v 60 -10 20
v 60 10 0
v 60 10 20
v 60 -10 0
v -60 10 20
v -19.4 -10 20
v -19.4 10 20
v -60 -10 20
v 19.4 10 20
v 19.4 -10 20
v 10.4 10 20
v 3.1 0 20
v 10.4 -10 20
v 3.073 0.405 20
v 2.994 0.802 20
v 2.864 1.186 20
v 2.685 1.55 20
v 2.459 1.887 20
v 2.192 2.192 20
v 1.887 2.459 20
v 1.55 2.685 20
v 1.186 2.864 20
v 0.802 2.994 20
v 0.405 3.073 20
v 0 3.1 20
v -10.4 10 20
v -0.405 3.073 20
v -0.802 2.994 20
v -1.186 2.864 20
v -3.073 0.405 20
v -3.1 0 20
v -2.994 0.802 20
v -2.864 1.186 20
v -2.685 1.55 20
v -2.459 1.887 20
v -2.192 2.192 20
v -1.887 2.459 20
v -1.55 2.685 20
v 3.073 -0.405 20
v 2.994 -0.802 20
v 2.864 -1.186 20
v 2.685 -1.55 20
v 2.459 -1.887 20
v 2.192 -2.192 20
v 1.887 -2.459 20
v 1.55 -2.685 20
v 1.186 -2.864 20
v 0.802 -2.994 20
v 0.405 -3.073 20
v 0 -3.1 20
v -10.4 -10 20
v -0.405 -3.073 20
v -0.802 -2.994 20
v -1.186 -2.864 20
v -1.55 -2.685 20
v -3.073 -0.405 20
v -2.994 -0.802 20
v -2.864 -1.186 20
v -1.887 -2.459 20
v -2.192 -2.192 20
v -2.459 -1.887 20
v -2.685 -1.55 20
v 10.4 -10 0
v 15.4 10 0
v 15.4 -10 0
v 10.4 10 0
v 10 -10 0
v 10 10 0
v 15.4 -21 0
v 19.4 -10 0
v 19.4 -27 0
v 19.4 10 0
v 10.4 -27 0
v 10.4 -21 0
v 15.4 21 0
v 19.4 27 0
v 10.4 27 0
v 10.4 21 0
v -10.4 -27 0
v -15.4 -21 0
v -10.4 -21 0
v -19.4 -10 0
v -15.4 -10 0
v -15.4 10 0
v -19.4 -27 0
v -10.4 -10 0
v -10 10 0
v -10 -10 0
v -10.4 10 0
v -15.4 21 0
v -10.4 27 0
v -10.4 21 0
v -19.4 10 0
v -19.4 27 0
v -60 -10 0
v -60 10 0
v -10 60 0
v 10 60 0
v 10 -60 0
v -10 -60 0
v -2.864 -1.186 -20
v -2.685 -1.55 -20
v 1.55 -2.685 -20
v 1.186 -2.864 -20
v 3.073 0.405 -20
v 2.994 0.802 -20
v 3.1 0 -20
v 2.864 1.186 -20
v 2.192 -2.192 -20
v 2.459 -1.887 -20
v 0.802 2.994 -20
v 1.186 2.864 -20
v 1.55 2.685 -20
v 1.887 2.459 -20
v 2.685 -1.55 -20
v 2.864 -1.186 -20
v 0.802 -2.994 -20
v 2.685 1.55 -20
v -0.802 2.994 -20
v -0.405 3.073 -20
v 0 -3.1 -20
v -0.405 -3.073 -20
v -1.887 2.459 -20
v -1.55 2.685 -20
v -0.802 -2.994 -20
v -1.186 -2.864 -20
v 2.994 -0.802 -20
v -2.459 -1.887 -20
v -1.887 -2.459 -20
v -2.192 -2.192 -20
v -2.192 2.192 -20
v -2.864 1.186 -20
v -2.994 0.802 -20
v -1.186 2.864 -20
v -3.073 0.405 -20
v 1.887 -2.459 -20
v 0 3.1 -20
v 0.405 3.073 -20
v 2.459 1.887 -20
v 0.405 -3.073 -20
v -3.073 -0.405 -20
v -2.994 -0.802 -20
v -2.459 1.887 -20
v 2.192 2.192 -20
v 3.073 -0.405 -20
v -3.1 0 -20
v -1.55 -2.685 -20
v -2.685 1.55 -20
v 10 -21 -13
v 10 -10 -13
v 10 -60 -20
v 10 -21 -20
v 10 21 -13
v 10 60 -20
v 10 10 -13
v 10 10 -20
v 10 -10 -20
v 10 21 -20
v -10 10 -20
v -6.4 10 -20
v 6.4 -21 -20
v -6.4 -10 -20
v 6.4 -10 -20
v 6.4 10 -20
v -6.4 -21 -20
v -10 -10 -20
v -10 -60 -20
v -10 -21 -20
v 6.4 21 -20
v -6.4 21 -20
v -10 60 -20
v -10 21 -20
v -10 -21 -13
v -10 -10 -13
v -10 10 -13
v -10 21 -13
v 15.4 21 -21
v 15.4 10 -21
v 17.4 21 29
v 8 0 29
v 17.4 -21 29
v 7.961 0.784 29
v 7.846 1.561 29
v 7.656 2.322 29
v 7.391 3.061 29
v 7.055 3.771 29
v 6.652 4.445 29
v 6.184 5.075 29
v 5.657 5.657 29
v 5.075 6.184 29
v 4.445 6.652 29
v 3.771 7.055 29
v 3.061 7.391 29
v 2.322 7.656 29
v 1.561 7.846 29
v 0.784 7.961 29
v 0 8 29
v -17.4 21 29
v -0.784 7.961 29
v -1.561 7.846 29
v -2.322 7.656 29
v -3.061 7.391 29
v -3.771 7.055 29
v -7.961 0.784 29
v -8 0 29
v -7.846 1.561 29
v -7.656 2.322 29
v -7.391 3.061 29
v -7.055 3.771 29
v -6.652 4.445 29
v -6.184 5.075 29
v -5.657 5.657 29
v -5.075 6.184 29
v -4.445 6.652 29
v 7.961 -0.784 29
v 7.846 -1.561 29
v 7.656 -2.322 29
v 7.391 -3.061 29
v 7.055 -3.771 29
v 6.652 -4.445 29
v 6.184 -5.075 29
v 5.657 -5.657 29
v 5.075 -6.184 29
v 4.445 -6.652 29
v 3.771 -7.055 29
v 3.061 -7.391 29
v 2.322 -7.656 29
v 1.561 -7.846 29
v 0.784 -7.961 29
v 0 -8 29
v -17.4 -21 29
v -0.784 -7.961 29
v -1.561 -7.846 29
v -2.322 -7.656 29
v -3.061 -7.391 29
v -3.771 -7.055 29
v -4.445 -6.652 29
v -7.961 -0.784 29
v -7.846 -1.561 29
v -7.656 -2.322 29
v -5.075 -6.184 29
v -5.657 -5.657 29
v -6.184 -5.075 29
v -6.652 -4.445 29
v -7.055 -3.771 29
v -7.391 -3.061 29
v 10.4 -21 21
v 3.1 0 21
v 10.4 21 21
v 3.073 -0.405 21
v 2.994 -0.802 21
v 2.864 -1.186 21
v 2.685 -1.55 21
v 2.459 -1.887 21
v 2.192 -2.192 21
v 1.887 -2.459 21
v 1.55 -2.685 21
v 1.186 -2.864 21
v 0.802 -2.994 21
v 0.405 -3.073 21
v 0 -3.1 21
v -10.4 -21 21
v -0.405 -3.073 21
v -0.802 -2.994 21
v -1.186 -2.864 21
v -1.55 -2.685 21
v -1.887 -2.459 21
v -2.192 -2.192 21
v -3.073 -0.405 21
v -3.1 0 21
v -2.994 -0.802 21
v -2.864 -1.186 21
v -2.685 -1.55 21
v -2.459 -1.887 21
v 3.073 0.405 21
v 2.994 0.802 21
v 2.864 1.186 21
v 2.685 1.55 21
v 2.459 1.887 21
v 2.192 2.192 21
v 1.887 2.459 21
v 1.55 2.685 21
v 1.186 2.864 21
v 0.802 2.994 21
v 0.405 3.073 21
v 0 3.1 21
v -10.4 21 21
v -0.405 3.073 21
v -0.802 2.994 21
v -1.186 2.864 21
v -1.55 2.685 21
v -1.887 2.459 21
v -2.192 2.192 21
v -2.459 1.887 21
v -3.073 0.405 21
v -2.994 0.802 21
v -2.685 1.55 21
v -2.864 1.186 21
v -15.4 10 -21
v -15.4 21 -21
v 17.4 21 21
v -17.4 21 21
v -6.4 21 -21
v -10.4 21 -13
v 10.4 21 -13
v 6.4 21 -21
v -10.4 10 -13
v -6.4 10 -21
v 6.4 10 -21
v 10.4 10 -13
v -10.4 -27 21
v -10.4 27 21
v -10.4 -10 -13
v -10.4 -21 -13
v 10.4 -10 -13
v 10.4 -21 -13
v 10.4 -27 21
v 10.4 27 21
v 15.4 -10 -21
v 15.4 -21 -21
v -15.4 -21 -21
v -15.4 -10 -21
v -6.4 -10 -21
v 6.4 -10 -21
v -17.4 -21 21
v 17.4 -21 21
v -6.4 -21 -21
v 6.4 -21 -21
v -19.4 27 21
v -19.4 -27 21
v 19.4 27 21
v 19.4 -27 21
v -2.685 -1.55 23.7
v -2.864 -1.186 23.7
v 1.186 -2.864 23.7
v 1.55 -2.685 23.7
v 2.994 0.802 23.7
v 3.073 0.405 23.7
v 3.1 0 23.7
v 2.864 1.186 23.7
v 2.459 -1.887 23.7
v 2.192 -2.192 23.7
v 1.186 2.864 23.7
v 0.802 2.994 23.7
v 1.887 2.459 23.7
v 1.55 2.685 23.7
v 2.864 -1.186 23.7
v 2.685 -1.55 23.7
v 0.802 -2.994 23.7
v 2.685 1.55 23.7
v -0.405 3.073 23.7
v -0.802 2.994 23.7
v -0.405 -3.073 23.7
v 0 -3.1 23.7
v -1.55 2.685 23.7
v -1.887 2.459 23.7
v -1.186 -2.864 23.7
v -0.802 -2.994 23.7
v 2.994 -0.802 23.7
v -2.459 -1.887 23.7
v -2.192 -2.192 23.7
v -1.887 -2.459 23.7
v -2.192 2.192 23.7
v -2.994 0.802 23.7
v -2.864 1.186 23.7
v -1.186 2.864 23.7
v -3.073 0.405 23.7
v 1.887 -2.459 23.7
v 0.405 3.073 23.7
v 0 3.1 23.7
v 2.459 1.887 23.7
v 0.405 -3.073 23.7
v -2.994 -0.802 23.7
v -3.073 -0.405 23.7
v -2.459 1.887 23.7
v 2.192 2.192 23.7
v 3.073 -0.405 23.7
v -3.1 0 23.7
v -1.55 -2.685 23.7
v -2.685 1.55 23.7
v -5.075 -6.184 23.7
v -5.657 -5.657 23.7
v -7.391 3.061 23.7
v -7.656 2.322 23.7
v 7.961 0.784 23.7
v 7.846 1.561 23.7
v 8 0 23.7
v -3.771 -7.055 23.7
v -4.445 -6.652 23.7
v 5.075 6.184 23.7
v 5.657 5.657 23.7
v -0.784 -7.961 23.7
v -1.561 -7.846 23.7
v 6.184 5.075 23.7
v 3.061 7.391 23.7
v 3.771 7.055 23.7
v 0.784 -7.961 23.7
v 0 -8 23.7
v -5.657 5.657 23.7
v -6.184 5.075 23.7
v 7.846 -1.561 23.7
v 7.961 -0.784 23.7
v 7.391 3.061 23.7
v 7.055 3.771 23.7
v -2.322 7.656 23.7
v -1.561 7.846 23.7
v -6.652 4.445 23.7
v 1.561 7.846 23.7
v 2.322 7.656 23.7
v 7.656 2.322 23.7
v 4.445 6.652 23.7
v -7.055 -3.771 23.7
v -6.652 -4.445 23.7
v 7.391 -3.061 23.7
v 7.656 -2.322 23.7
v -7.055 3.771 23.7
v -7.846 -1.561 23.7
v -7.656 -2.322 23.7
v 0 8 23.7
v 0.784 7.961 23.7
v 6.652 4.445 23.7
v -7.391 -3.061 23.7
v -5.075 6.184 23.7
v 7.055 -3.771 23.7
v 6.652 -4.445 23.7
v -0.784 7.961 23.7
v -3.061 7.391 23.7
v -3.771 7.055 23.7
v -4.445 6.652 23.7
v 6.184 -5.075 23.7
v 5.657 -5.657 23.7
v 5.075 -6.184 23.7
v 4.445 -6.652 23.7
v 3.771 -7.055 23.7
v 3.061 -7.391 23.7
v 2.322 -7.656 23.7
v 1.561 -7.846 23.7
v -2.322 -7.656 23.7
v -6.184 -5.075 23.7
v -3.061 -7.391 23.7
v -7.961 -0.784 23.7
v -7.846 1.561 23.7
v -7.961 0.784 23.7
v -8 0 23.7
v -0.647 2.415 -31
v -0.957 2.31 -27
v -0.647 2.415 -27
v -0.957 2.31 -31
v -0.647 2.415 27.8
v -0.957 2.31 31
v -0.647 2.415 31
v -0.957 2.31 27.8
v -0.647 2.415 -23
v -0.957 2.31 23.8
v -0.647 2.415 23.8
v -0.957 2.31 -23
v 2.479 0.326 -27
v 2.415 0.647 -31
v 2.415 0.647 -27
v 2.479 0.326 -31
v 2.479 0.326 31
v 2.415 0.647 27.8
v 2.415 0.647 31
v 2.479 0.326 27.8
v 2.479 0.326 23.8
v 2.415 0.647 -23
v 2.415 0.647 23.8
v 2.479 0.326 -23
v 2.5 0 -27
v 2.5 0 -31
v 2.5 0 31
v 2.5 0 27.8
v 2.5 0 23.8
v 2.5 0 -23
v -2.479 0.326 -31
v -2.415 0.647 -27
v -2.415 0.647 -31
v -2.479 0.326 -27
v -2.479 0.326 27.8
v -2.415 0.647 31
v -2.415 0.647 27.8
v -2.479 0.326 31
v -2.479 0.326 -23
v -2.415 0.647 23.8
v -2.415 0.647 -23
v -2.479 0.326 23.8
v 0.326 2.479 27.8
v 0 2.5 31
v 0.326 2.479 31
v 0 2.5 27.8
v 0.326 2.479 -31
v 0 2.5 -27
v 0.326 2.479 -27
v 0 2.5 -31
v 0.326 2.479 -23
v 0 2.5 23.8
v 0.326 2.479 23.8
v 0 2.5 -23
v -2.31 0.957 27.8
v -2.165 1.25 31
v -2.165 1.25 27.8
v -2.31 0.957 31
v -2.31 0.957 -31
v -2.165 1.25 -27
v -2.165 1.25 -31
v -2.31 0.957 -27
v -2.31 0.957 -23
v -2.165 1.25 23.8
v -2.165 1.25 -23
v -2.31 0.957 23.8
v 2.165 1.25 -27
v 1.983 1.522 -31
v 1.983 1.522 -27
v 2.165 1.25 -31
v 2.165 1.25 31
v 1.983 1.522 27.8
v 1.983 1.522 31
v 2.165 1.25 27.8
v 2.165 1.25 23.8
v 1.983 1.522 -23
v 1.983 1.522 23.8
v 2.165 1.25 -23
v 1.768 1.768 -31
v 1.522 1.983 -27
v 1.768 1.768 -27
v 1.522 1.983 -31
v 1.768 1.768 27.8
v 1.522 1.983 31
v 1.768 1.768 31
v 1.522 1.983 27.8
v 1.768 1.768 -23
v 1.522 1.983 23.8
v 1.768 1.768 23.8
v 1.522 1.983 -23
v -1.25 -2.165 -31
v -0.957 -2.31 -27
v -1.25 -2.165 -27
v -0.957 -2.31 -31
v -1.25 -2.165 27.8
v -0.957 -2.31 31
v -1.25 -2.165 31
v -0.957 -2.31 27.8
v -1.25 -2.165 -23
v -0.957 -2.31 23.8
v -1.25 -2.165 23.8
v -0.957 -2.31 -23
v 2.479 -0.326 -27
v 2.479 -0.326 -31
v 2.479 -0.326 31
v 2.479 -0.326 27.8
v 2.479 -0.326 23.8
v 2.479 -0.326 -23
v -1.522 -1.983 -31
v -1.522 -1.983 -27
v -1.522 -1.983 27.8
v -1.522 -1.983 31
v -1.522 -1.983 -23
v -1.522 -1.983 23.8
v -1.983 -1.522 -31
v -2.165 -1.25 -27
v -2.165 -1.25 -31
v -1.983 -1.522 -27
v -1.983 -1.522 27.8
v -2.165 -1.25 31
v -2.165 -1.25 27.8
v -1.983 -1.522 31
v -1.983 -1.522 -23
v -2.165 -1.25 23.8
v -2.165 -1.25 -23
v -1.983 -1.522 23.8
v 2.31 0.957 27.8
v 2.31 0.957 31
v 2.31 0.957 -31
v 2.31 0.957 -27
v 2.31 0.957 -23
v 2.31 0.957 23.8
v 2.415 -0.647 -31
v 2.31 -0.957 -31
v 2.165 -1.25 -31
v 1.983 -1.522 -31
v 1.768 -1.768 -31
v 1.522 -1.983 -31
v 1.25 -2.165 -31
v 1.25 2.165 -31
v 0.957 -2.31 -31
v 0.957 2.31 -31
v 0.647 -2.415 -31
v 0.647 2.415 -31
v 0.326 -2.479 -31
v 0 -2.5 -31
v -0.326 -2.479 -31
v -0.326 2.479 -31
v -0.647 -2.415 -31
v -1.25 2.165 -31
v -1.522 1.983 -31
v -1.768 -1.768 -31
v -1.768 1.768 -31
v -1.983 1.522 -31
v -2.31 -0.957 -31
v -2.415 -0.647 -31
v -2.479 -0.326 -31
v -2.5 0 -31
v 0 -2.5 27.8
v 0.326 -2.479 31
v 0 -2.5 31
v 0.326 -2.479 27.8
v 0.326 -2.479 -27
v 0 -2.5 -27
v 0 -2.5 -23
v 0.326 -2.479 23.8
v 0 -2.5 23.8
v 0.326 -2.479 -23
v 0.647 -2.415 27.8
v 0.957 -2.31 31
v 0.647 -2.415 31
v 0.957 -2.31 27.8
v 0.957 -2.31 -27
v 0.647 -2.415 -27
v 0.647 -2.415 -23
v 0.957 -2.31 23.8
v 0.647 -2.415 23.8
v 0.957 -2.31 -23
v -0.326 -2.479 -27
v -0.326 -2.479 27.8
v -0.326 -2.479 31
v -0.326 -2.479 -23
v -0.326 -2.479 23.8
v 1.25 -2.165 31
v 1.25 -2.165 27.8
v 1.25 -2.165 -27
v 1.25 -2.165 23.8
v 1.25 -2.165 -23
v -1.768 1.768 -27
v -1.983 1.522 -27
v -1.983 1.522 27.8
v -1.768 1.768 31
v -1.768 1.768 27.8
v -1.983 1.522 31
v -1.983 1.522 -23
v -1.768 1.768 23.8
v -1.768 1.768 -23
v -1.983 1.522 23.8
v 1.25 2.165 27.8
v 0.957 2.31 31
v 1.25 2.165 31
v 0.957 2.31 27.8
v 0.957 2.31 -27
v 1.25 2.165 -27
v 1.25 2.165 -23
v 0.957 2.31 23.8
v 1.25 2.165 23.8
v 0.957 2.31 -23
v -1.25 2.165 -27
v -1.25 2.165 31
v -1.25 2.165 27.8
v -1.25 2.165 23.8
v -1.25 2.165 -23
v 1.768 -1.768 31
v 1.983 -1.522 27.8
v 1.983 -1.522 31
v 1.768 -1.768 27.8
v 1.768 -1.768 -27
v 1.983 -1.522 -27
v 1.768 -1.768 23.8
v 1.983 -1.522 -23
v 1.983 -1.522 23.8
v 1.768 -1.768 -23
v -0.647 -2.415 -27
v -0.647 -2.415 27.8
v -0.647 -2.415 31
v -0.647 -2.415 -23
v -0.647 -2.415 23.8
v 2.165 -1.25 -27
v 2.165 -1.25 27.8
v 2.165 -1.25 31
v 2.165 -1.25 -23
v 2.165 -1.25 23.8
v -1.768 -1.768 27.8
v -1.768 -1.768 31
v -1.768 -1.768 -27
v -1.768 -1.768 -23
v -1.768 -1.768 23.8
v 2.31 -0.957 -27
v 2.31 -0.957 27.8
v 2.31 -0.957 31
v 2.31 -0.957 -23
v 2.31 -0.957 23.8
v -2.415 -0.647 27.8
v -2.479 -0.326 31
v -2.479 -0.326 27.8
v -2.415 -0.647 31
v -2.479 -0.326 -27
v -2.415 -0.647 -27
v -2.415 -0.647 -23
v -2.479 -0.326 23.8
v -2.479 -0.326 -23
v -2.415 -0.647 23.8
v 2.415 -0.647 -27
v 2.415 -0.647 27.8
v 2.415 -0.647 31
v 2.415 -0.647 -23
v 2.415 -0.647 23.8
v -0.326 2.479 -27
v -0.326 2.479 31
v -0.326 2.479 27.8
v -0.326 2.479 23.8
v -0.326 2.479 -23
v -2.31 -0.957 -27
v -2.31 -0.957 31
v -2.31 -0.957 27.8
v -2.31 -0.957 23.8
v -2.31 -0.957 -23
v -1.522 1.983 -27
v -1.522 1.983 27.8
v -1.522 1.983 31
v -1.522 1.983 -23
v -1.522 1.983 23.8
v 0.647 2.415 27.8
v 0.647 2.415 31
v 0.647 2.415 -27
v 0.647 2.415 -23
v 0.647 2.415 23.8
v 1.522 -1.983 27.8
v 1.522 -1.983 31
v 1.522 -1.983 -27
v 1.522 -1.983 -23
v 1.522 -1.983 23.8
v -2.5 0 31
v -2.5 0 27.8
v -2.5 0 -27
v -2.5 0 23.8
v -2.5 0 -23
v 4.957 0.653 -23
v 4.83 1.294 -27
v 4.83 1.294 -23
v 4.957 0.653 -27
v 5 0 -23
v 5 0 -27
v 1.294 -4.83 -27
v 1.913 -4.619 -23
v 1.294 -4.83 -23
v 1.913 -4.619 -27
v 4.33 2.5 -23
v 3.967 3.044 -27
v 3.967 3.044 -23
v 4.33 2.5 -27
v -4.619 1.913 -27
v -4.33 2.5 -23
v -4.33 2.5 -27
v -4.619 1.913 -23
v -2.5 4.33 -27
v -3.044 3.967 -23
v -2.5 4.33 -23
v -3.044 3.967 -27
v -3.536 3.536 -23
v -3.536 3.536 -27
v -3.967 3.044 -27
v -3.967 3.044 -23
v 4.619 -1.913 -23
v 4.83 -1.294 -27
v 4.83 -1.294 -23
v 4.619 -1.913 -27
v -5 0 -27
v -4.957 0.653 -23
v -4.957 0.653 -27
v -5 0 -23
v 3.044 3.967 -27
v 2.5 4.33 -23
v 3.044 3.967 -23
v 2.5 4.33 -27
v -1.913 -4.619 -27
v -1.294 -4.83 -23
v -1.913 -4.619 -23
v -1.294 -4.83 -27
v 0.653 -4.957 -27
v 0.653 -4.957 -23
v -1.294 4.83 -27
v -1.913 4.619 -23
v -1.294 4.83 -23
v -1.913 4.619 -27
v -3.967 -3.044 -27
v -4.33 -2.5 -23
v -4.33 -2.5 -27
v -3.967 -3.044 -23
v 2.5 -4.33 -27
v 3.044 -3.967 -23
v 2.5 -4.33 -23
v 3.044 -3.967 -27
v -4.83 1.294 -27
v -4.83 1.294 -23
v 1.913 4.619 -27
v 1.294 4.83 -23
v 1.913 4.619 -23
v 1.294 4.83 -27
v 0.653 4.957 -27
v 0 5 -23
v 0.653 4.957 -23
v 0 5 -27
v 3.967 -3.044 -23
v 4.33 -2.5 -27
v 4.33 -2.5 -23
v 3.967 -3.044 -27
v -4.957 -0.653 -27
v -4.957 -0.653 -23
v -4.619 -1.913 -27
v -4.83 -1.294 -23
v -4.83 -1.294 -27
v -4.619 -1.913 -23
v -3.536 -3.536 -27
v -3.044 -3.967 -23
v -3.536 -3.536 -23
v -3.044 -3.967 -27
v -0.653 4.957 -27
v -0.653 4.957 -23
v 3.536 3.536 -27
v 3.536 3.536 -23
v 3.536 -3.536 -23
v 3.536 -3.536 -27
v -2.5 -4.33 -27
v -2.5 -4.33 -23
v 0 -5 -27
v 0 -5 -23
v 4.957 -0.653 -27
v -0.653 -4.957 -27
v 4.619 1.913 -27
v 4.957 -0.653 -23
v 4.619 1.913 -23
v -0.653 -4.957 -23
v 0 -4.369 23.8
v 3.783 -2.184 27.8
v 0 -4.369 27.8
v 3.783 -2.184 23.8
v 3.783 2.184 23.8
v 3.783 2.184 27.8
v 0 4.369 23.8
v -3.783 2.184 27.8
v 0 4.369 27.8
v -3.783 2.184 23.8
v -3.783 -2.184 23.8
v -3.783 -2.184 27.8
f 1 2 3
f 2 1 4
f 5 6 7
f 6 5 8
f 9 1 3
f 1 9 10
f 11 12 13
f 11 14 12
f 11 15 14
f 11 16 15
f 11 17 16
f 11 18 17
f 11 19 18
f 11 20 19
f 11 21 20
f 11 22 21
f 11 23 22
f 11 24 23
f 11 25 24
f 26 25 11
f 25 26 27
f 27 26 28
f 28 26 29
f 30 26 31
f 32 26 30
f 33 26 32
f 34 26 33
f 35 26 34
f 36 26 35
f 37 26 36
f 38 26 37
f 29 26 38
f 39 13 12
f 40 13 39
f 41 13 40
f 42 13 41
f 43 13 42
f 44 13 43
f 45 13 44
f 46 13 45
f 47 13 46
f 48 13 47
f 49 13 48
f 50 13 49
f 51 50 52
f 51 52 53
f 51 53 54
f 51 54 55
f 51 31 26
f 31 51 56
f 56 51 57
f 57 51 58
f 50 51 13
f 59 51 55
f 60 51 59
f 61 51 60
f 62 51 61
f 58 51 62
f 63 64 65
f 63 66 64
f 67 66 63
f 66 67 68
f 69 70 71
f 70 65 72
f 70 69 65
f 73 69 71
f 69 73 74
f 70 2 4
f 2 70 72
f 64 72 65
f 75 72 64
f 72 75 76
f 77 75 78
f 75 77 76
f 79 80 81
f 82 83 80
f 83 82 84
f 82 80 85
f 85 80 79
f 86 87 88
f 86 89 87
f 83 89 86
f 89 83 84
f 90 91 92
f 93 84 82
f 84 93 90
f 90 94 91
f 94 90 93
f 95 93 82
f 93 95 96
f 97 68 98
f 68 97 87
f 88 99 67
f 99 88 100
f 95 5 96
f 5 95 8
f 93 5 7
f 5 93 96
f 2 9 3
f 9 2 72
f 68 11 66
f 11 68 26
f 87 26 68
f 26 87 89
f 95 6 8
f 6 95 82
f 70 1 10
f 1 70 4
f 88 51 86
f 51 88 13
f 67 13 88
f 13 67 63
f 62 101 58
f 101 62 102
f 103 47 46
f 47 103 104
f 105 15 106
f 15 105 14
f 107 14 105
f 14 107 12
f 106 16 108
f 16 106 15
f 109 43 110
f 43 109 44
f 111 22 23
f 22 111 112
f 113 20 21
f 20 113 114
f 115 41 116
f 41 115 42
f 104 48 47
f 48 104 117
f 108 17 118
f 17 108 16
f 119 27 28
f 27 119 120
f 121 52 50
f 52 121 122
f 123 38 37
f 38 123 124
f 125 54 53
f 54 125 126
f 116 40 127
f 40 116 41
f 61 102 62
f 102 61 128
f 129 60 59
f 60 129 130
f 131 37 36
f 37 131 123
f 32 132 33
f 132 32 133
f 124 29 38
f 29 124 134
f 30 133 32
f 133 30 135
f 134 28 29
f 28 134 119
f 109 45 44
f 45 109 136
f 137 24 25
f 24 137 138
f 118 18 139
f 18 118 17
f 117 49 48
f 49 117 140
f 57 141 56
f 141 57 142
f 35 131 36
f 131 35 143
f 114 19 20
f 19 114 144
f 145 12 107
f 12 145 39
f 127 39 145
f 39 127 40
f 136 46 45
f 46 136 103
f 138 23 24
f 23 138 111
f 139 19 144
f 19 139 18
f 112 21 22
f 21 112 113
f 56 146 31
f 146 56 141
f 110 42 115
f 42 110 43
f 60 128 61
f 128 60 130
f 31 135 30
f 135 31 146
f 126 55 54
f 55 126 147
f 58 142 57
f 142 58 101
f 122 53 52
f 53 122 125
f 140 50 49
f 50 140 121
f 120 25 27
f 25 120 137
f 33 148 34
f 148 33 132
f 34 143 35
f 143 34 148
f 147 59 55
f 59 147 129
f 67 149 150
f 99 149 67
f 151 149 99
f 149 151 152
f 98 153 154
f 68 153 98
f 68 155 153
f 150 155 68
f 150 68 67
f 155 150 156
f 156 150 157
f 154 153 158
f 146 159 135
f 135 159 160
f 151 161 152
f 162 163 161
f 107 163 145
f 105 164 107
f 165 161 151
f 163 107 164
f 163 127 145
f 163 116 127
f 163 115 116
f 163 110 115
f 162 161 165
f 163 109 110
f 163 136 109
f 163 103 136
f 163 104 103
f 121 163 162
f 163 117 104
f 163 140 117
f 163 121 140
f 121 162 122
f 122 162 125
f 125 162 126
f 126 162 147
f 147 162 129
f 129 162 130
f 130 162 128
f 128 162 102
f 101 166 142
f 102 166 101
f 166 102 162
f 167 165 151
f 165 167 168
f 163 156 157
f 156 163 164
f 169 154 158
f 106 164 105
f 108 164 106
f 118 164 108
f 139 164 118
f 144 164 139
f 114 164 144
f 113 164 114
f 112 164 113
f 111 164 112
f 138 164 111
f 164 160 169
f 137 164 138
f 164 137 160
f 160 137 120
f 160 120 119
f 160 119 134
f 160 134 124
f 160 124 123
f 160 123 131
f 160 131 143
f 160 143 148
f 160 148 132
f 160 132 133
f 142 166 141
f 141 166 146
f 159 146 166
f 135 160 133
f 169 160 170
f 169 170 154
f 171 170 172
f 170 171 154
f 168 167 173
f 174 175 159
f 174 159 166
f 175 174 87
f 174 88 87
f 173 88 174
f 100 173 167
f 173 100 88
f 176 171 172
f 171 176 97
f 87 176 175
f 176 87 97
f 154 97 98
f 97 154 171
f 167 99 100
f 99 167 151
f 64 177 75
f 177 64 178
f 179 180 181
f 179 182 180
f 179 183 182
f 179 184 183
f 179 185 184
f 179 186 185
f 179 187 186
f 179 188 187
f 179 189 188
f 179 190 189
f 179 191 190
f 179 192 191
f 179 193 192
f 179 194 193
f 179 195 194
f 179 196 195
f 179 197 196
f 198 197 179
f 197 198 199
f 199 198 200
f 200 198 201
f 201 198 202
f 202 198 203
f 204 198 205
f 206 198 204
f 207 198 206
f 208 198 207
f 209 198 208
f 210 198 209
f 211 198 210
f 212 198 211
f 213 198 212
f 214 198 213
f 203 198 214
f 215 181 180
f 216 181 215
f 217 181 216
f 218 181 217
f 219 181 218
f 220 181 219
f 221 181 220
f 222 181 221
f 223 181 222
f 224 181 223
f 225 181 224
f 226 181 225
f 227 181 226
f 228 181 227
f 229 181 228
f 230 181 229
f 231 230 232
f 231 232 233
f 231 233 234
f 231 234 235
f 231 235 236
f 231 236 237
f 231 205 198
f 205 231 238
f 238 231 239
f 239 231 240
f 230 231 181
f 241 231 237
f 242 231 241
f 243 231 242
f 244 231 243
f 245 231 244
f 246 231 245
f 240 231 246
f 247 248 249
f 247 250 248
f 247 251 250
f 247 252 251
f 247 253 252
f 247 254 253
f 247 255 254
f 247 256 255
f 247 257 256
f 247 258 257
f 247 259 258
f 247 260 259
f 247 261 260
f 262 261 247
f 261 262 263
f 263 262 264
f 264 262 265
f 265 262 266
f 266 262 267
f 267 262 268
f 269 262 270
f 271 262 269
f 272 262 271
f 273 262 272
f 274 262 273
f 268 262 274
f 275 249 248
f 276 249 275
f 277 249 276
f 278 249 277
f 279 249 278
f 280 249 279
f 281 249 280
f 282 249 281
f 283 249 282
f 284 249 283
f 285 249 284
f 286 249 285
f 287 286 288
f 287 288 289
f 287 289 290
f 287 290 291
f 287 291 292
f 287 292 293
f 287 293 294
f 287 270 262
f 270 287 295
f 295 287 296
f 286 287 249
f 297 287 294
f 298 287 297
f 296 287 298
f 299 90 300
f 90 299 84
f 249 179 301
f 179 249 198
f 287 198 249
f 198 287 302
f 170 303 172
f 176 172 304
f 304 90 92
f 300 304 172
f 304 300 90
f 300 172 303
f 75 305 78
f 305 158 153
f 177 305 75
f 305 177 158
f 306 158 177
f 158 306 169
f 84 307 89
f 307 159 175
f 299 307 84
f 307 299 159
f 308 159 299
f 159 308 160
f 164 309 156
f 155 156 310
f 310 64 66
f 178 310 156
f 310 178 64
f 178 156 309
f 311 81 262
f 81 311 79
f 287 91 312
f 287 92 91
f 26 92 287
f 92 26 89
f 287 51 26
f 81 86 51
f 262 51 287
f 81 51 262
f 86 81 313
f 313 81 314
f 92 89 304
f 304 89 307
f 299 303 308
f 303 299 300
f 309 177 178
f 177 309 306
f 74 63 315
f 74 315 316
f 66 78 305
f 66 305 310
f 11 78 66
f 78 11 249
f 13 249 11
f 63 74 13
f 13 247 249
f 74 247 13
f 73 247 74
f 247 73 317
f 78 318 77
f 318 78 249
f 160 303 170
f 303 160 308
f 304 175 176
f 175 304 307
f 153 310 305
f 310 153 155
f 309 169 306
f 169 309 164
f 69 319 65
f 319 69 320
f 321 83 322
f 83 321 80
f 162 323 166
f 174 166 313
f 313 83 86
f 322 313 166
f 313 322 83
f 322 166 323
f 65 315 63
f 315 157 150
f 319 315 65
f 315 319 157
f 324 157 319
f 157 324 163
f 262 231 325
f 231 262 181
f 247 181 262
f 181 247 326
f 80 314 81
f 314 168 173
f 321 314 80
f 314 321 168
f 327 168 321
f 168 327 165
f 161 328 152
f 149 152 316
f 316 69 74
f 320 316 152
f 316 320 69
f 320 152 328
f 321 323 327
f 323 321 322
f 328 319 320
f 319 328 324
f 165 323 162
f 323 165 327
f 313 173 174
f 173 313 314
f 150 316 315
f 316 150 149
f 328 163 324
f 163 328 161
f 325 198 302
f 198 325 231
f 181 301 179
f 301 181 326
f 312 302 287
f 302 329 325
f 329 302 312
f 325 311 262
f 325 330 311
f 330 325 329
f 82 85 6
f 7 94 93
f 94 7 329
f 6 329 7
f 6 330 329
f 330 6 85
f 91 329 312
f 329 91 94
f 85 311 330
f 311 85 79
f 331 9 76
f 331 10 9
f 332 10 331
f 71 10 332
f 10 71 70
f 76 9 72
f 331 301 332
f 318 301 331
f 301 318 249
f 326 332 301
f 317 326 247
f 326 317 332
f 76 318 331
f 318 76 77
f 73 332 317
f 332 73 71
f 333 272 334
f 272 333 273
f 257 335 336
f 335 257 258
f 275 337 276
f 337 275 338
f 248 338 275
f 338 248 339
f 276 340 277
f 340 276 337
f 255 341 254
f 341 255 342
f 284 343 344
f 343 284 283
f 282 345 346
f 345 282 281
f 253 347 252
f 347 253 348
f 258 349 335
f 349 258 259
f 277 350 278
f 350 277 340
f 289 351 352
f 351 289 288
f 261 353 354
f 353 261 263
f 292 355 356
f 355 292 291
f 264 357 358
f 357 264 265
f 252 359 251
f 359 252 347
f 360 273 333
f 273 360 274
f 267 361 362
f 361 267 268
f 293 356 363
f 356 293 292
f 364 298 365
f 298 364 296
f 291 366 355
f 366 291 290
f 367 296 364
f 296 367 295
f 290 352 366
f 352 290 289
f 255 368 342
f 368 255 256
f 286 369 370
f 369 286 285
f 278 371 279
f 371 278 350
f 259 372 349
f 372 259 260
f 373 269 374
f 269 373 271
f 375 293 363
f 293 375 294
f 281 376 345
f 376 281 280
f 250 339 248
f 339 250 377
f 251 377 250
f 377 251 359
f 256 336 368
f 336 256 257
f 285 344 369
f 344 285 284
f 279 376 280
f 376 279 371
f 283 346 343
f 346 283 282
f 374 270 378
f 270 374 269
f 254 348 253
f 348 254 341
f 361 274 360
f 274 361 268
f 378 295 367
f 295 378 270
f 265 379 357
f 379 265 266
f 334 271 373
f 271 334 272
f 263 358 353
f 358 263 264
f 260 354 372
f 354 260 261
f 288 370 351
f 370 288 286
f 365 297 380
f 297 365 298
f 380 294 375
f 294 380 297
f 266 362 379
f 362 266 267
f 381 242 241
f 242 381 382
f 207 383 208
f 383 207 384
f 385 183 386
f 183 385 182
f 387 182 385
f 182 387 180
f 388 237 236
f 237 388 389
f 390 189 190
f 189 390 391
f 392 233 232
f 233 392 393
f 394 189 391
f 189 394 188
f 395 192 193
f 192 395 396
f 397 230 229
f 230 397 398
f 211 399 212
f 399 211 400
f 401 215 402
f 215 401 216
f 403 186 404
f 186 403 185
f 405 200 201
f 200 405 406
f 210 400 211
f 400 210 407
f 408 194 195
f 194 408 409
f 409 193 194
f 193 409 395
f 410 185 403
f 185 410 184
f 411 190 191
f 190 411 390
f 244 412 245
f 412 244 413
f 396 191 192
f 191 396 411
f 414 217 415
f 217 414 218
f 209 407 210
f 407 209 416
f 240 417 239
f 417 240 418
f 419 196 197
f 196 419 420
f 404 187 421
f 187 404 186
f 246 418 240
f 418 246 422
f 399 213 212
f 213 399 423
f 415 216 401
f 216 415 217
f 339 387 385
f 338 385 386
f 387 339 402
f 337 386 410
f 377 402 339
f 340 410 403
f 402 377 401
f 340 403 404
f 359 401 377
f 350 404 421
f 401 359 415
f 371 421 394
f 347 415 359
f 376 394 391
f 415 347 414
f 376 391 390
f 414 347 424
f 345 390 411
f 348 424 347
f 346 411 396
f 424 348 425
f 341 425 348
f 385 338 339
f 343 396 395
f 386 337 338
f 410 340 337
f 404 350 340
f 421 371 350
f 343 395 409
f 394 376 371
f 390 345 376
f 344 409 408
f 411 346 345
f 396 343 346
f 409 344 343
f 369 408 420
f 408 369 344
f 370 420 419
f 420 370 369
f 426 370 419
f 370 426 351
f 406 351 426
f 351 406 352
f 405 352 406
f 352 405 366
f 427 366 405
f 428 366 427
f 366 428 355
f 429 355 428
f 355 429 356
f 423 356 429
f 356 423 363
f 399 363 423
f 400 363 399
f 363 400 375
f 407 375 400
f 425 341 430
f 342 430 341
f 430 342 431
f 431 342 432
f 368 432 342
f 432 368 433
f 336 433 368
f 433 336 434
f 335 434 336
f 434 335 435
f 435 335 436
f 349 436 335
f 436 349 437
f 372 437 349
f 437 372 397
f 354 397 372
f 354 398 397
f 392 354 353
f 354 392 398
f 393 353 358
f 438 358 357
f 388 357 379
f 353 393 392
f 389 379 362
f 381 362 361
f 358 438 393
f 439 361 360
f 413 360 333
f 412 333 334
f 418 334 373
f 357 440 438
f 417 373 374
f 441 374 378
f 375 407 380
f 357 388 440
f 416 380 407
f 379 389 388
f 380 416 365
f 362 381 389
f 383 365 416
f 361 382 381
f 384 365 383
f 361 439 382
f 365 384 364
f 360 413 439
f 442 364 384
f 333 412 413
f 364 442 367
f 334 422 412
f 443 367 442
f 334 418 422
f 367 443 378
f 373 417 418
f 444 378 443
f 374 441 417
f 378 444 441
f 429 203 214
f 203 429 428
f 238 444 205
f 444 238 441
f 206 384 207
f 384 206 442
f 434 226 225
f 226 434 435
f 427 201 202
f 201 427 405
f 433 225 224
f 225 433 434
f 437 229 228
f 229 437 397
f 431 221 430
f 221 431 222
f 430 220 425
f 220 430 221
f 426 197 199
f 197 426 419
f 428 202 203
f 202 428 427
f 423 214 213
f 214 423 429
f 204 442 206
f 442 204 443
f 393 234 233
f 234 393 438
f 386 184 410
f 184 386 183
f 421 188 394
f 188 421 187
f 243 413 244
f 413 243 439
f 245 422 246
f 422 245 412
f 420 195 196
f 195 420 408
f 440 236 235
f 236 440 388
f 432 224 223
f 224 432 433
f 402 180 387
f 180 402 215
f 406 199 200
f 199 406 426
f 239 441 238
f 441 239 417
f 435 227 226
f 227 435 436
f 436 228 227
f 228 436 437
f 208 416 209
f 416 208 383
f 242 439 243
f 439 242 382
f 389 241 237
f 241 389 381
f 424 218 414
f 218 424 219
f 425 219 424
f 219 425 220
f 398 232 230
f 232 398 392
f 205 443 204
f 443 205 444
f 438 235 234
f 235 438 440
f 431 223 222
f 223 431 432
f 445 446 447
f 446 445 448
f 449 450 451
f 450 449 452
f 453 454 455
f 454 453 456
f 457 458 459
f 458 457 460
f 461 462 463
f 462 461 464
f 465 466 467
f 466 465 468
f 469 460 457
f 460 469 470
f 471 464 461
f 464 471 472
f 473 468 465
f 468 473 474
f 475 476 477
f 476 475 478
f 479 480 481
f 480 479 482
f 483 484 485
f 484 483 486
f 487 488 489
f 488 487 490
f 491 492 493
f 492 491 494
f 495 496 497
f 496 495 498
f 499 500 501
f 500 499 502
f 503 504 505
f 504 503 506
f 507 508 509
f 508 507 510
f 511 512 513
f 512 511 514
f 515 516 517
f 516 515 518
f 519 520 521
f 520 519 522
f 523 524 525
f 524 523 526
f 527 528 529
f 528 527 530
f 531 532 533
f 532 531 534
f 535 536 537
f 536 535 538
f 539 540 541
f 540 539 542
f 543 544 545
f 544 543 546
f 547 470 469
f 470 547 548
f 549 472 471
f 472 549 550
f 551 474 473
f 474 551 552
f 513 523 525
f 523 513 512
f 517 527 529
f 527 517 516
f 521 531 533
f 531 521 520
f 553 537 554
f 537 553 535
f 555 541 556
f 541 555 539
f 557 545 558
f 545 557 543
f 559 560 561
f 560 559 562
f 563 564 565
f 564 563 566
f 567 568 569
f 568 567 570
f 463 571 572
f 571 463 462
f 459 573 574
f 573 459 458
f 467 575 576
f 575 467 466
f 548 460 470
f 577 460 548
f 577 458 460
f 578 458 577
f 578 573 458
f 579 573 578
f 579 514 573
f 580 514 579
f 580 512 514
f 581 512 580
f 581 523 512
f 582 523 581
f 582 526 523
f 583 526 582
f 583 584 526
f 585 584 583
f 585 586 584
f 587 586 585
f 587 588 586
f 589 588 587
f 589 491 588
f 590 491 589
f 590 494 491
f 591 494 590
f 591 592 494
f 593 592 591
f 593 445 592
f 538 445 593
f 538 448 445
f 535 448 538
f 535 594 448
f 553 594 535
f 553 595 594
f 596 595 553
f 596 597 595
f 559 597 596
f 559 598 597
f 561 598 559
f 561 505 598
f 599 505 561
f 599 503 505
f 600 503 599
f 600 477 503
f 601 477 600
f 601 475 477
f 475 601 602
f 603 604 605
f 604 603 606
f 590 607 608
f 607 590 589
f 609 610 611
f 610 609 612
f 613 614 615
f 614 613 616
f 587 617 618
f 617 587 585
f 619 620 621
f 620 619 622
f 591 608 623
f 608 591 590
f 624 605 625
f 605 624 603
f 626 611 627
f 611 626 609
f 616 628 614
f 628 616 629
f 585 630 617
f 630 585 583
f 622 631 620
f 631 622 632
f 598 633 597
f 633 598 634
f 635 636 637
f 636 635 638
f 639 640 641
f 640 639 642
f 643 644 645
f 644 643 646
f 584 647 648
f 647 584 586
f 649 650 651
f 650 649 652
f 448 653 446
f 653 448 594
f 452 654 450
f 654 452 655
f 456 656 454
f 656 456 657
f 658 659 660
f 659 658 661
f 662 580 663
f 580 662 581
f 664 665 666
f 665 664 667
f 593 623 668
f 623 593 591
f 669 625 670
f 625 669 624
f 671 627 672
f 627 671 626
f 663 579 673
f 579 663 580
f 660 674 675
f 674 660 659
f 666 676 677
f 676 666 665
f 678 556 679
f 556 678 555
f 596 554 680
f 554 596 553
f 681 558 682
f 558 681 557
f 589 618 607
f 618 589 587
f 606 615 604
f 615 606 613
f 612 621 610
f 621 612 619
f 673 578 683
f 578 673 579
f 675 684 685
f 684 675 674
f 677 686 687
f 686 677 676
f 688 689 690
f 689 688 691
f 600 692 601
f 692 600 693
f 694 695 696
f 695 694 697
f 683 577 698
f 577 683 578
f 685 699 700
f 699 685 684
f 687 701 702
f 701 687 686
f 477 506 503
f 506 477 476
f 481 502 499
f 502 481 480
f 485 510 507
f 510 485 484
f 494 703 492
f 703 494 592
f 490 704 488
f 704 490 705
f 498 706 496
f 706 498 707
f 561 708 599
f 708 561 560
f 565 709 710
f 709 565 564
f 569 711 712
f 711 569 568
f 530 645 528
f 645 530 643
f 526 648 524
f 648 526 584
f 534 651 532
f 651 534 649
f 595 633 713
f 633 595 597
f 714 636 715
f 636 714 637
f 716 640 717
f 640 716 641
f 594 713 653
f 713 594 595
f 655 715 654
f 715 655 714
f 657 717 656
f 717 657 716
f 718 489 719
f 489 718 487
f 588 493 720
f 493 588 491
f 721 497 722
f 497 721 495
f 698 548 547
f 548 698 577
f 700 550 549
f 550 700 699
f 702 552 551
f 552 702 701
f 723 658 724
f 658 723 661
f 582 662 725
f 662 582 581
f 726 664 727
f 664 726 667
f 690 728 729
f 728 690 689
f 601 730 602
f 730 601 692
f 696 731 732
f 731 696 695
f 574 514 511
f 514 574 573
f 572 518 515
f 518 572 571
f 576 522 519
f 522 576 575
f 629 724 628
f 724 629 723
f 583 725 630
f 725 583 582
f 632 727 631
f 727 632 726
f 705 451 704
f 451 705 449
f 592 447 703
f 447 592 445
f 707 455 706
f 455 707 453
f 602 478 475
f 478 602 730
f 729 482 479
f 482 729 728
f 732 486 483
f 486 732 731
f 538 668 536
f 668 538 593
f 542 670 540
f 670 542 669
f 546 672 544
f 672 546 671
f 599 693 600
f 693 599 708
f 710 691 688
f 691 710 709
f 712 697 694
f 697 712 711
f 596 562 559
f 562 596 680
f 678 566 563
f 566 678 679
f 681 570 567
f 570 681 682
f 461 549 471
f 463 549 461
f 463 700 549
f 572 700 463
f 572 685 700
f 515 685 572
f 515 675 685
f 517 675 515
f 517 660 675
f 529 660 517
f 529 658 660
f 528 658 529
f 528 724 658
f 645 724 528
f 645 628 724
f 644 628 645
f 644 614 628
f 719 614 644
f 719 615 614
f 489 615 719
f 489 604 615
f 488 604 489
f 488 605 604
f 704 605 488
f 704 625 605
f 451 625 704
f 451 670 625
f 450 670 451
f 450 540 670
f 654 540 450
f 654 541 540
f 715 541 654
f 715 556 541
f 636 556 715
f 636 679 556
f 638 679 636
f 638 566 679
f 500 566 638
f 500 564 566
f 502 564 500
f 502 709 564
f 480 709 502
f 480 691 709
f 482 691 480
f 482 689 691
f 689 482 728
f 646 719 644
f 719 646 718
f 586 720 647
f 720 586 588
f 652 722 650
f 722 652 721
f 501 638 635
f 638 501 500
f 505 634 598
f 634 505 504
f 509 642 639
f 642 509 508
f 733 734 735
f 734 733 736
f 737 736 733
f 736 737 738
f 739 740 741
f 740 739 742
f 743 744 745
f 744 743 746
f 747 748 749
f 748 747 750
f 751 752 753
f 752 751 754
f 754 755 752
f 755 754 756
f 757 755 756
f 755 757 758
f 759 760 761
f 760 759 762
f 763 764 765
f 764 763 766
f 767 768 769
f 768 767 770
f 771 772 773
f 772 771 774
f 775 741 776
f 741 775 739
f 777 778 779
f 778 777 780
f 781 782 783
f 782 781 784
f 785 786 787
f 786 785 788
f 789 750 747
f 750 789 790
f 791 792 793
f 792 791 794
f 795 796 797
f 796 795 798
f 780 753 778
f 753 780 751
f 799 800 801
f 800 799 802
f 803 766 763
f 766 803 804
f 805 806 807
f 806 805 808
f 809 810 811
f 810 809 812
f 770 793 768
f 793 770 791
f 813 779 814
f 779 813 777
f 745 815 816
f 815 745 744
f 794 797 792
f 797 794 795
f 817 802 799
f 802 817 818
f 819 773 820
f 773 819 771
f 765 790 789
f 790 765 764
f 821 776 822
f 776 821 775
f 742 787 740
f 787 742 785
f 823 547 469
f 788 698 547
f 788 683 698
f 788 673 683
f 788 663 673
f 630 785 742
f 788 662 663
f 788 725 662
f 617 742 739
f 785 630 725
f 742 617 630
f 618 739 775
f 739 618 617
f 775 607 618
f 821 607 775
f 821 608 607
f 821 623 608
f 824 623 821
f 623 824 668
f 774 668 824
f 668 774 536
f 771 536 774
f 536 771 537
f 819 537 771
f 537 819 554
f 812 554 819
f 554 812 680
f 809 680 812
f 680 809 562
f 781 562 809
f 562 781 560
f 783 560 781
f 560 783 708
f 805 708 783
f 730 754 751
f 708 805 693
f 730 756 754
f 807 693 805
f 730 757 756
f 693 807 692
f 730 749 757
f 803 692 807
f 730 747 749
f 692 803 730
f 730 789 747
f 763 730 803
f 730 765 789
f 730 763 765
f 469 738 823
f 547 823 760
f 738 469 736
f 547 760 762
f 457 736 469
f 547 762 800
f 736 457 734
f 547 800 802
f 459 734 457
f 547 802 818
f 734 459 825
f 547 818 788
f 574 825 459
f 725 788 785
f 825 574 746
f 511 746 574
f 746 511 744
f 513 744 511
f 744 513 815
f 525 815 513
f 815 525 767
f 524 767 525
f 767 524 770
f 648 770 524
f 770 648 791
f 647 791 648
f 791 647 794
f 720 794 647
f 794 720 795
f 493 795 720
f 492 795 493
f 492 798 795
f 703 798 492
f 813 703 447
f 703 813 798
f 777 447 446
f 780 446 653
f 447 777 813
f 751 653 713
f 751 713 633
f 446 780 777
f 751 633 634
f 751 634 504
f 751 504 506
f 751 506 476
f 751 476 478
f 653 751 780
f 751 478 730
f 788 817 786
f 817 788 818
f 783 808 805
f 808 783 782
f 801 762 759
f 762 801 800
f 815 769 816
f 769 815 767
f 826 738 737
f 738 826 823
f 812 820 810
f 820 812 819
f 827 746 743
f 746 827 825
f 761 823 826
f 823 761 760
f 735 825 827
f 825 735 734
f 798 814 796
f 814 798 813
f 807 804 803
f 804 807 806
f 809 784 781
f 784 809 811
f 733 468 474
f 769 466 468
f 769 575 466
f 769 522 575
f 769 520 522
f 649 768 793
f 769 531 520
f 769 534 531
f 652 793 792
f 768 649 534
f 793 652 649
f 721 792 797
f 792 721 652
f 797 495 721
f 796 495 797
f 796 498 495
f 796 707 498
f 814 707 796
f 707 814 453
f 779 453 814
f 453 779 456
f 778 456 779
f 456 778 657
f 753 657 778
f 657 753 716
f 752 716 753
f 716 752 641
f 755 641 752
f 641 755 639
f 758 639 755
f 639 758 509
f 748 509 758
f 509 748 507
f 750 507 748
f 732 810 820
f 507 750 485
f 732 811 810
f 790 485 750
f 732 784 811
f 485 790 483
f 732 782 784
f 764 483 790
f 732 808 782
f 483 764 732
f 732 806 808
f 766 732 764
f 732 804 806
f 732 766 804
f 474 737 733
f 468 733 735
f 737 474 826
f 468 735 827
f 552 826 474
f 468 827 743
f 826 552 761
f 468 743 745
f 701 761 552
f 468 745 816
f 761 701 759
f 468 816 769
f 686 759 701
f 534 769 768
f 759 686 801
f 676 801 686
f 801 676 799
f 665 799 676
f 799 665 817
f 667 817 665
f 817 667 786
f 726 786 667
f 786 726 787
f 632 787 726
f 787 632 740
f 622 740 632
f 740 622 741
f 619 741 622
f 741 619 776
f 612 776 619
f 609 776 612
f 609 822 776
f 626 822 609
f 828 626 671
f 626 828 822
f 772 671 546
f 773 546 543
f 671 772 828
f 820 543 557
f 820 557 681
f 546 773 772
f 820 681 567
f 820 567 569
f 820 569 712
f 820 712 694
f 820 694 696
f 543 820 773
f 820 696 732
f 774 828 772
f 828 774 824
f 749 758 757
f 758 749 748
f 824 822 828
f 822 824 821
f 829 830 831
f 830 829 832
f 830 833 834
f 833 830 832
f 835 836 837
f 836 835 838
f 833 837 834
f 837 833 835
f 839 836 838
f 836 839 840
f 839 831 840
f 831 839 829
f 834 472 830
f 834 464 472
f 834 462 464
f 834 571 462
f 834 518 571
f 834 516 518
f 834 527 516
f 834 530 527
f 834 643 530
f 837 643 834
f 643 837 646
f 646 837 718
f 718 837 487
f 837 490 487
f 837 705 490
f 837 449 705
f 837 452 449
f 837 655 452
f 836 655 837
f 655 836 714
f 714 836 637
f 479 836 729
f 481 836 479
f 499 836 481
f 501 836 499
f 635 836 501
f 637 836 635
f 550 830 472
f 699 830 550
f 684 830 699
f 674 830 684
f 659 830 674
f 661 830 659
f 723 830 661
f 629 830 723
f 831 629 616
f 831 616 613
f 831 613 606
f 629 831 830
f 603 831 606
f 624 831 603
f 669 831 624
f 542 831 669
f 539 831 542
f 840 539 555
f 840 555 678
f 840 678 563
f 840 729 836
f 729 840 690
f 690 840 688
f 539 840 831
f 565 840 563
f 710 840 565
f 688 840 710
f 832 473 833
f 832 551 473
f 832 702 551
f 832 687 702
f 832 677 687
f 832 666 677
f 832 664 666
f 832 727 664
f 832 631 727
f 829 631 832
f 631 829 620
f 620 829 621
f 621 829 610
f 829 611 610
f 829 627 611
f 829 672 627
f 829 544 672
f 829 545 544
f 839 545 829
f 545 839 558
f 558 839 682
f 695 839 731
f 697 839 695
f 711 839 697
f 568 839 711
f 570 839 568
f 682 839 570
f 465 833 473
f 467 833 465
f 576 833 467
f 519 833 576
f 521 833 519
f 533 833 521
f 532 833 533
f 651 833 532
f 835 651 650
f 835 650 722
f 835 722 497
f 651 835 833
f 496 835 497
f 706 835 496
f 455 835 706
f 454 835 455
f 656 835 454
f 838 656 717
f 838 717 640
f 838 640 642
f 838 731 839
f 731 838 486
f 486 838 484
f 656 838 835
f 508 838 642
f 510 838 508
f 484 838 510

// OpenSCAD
// Pingpang-SmartGear — one-piece double-U joint guard, v0.8
//
// Mechanical contract for this correction:
//   x = barrier long direction
//   y = front/back direction
//   z = vertical direction
//
// The printed part is ONE solid.  It contains a front U and a back U, joined
// by one printed top yoke.  The clear distance between the two U inner faces
// is exactly 20 mm.  There is no male/female printed connection and no second
// printed part to bolt together.
//
// The context tubes are the local joint envelope:
//   upper long 20x20 tube: axis x, z=0..20
//   lower perpendicular 20x20 tube: axis y, z=-20..0
// They touch at z=0 and share a vertical screw axis through their centre.
//
// v0.8 annotation interpretation:
//   red  = the upper left/right side regions are solid walls;
//   green = add material at the upper front-to-back shoulder/overlap region,
//           without making downward-facing wings or reducing the 20 mm tube
//           passage.

$fn = 48;

PART = "assembly_iso";

// ---------- fixed interface dimensions ----------
tube = 20;
u_inner_distance_y = 20;       // hard requirement: inner face to inner face
u_clearance_x = 0.8;           // only the x direction has initial PETG relief
u_inner_width_x = tube + u_clearance_x;
wall = 5.0;
u_outer_width_x = u_inner_width_x + 2 * wall;

front_y_inner = u_inner_distance_y / 2;
base_plate_depth_y = 7.0;
front_back_extension_y = 4.0;  // complete U plate front-to-back extension
plate_depth_y = base_plate_depth_y + front_back_extension_y;
front_y_outer = front_y_inner + plate_depth_y;
back_y_outer = -front_y_outer;
back_y_inner = -front_y_inner;

foot_bottom_z = -tube;
below_foot_extension_z = 1.0;
u_bottom = foot_bottom_z - below_foot_extension_z;
top_yoke_bottom_z = 21.0;       // 1 mm above the upper 20x20 tube top
top_yoke_thickness = 8.0;       // keep the v0.7 top height/clearance
u_top = top_yoke_bottom_z + top_yoke_thickness;
hook_depth_x = 6.5;
hook_height_z = 8.0;            // vertical抱脚 contact above the foot bottom
solid_upper_wall_bottom_z = 0.0;

// ---------- red solid wall and green reinforcement ----------
// These walls keep their inner faces at +/-10.4 mm, so the 20 mm tube gap is
// not reduced.  The extra 2 mm is added only toward the outside.
solid_side_wall_thickness = 7.0;
top_yoke_width_x = u_inner_width_x + 2 * solid_side_wall_thickness;

// The green shoulder extends only toward the outside in x and front/back in y.
// It occupies the upper side-wall region z=0..21; it does not extend downward
// into the foot or the lower retaining-hook opening.
reinforcement_outset_x = 4.0;
reinforcement_front_back_extension_y = 6.0;
reinforcement_bottom_z = 0.0;
reinforcement_top_z = top_yoke_bottom_z;

// Preview-only context: show the complete lower foot rather than a clipped
// 20 mm joint slice.  This does not change the printable part.
preview_foot_length_y = 120.0;

// The axial screw passage is a true through-hole in the printed piece.  This
// is clearance only; no printed thread is modeled.
screw_clearance_d = 6.2;

// Full top nut envelope.  Use a round pocket so a hex nut can enter in any
// rotational orientation; the central screw passage remains through.
nut_pocket_d = 16.0;
nut_pocket_depth = 5.2;
nut_height = 4.0;
preview_nut_af = 8.0;

assert(u_inner_distance_y == 20, "双 U 内距离必须保持 20 mm");
assert(reinforcement_bottom_z >= foot_bottom_z, "加强体不能低于脚底限位");

// ---------- helpers ----------
module box_at(xc, yc, zc, sx, sy, sz) {
    translate([xc, yc, zc]) cube([sx, sy, sz], center = true);
}

module u_plate(y0, y1) {
    depth = y1 - y0;
    yc = (y0 + y1) / 2;
    left_x = -u_outer_width_x / 2 + wall / 2;
    right_x = u_outer_width_x / 2 - wall / 2;
    lip_z = u_bottom + hook_height_z / 2;
    left_lip_x = -u_outer_width_x / 2 + wall / 2 + hook_depth_x / 2;
    right_lip_x = u_outer_width_x / 2 - wall / 2 - hook_depth_x / 2;
    union() {
        // U top and two continuous arms.
        box_at(0, yc, u_top - top_yoke_thickness / 2,
               u_outer_width_x, depth, top_yoke_thickness);
        box_at(left_x, yc, (u_top + u_bottom) / 2,
               wall, depth, u_top - u_bottom);
        box_at(right_x, yc, (u_top + u_bottom) / 2,
               wall, depth, u_top - u_bottom);

        // Inward lower hooks: the actual anti-rotation retaining feature.
        box_at(left_lip_x, yc, lip_z,
               hook_depth_x, depth, hook_height_z);
        box_at(right_lip_x, yc, lip_z,
               hook_depth_x, depth, hook_height_z);
    }
}

module printed_yokes() {
    // The top yoke joins both U plates into one roof.  It is wider than the
    // nominal U top only toward the outside, reinforcing the top shoulders.
    box_at(0, 0, u_top - top_yoke_thickness / 2,
           top_yoke_width_x, 2 * front_y_outer, top_yoke_thickness);
}

module red_solid_upper_side_walls() {
    // Red-marked region: from the upper tube level down to z=0, both side
    // walls are solid across the complete front/back U depth.  The lower foot
    // remains open except for the U arms and inward retaining hooks.
    left_x = -u_inner_width_x / 2 - solid_side_wall_thickness / 2;
    right_x = u_inner_width_x / 2 + solid_side_wall_thickness / 2;
    wall_height = u_top - solid_upper_wall_bottom_z;

    box_at(left_x, 0, solid_upper_wall_bottom_z + wall_height / 2,
           solid_side_wall_thickness, 2 * front_y_outer, wall_height);
    box_at(right_x, 0, solid_upper_wall_bottom_z + wall_height / 2,
           solid_side_wall_thickness, 2 * front_y_outer, wall_height);
}

module green_reinforcement_shoulders() {
    // Green-marked region: two continuous upper side-wall reinforcement bands
    // running from the front U to the back U.  They are rectangular solid
    // additions, not four end blocks and not downward-sloping ribs.  They
    // reinforce the full front-to-back overlap while leaving lower hooks open.
    x_inner = u_inner_width_x / 2;
    x_outer = u_outer_width_x / 2 + reinforcement_outset_x;
    y_front_outer_plus = front_y_outer + reinforcement_front_back_extension_y;
    y_back_outer_minus = back_y_outer - reinforcement_front_back_extension_y;
    shoulder_depth = y_front_outer_plus - y_back_outer_minus;
    shoulder_height = reinforcement_top_z - reinforcement_bottom_z;

    right_x = (x_inner + x_outer) / 2;
    left_x = (-x_inner - x_outer) / 2;
    zc = (reinforcement_bottom_z + reinforcement_top_z) / 2;

    for (xc = [left_x, right_x]) {
        box_at(xc, 0, zc,
               x_outer - x_inner, shoulder_depth, shoulder_height);
    }
}

module vertical_screw_relief() {
    // TRUE THROUGH-HOLE: the small central cylinder runs from below u_bottom
    // to above u_top.  The lower-entering screw therefore cannot be blocked
    // by either the red solid walls or the green gussets.
    translate([0, 0, (u_bottom + u_top) / 2])
        cylinder(d = screw_clearance_d,
                 h = (u_top - u_bottom) + 8,
                 center = true);

    // Round pocket opens from the top face.  Its floor remains around the
    // through-hole so the nut is captured below the top surface.
    translate([0, 0, u_top - nut_pocket_depth / 2])
        cylinder(d = nut_pocket_d,
                 h = nut_pocket_depth + 0.2,
                 center = true,
                 $fn = 64);
}

module double_u_clip() {
    difference() {
        union() {
            // Front U: inner face y=+10, outer face y=+21.
            u_plate(front_y_inner, front_y_outer);

            // Back U: inner face y=-10, outer face y=-21.
            u_plate(back_y_outer, back_y_inner);

            printed_yokes();
            red_solid_upper_side_walls();
            green_reinforcement_shoulders();
        }
        vertical_screw_relief();
    }
}

// ---------- context envelope for preview only ----------
module vertical_bore() {
    translate([0, 0, 0])
        cylinder(d = screw_clearance_d, h = 60, center = true);
}

module upper_long_tube() {
    color([0.58, 0.61, 0.66])
        difference() {
            translate([0, 0, tube / 2])
                cube([120, tube, tube], center = true);
            vertical_bore();
        }
}

module lower_cross_tube() {
    // Preview the complete lower foot along y.  The printable interface still
    // uses the exact 20 mm gap between the two U inner faces.
    color([0.28, 0.45, 0.78])
        difference() {
            translate([0, 0, -tube / 2])
                cube([tube, preview_foot_length_y, tube], center = true);
            vertical_bore();
        }
}

module vertical_joint_screw() {
    color([0.82, 0.82, 0.84])
        translate([0, 0, 0])
            cylinder(d = 5.0, h = 62, center = true);

    // Screw head below the lower yoke.
    color([0.92, 0.70, 0.12])
        translate([0, 0, u_bottom - 4])
            cylinder(d = 10.0, h = 4.0, center = true);

    // The nut sits inside the recessed top pocket, below the top surface.
    color([0.92, 0.70, 0.12])
        translate([0, 0, u_top - nut_pocket_depth + nut_height / 2])
            rotate([0, 0, 30])
                cylinder(r = preview_nut_af / (2 * cos(30)) - 0.25,
                         h = nut_height,
                         center = true,
                         $fn = 6);
}

module assembly_iso() {
    upper_long_tube();
    lower_cross_tube();
    color([0.96, 0.39, 0.08]) double_u_clip();
    vertical_joint_screw();
}

module base_clip_for_marked_preview() {
    // Diagnostic-only base: the red and green additions are rendered
    // separately below so the annotation mapping can be inspected.
    difference() {
        union() {
            u_plate(front_y_inner, front_y_outer);
            u_plate(back_y_outer, back_y_inner);
            printed_yokes();
        }
        vertical_screw_relief();
    }
}

module assembly_marked() {
    upper_long_tube();
    lower_cross_tube();
    color([0.96, 0.39, 0.08]) base_clip_for_marked_preview();
    color([0.95, 0.12, 0.08]) red_solid_upper_side_walls();
    color([0.22, 0.78, 0.24]) green_reinforcement_shoulders();
    vertical_joint_screw();
}

module assembly_section() {
    // Cut the positive-x half to expose the vertical through-hole and the
    // 20 mm gap without hiding the foot.
    intersection() {
        assembly_iso();
        translate([0, -100, -100]) cube([100, 200, 200]);
    }
}

module clip_front() {
    double_u_clip();
}

module clip_bottom() {
    double_u_clip();
}

module clip_top() {
    double_u_clip();
}

module clip_print_orientation() {
    // One-piece print orientation.  The y envelope is placed on z=0.
    translate([0, 0, front_y_outer])
        rotate([90, 0, 0]) double_u_clip();
}

if (PART == "clip") {
    double_u_clip();
} else if (PART == "clip_print_orientation") {
    clip_print_orientation();
} else if (PART == "assembly_section") {
    assembly_section();
} else if (PART == "assembly_marked") {
    assembly_marked();
} else if (PART == "clip_front") {
    clip_front();
} else if (PART == "clip_bottom") {
    clip_bottom();
} else if (PART == "clip_top") {
    clip_top();
} else {
    assembly_iso();
}
